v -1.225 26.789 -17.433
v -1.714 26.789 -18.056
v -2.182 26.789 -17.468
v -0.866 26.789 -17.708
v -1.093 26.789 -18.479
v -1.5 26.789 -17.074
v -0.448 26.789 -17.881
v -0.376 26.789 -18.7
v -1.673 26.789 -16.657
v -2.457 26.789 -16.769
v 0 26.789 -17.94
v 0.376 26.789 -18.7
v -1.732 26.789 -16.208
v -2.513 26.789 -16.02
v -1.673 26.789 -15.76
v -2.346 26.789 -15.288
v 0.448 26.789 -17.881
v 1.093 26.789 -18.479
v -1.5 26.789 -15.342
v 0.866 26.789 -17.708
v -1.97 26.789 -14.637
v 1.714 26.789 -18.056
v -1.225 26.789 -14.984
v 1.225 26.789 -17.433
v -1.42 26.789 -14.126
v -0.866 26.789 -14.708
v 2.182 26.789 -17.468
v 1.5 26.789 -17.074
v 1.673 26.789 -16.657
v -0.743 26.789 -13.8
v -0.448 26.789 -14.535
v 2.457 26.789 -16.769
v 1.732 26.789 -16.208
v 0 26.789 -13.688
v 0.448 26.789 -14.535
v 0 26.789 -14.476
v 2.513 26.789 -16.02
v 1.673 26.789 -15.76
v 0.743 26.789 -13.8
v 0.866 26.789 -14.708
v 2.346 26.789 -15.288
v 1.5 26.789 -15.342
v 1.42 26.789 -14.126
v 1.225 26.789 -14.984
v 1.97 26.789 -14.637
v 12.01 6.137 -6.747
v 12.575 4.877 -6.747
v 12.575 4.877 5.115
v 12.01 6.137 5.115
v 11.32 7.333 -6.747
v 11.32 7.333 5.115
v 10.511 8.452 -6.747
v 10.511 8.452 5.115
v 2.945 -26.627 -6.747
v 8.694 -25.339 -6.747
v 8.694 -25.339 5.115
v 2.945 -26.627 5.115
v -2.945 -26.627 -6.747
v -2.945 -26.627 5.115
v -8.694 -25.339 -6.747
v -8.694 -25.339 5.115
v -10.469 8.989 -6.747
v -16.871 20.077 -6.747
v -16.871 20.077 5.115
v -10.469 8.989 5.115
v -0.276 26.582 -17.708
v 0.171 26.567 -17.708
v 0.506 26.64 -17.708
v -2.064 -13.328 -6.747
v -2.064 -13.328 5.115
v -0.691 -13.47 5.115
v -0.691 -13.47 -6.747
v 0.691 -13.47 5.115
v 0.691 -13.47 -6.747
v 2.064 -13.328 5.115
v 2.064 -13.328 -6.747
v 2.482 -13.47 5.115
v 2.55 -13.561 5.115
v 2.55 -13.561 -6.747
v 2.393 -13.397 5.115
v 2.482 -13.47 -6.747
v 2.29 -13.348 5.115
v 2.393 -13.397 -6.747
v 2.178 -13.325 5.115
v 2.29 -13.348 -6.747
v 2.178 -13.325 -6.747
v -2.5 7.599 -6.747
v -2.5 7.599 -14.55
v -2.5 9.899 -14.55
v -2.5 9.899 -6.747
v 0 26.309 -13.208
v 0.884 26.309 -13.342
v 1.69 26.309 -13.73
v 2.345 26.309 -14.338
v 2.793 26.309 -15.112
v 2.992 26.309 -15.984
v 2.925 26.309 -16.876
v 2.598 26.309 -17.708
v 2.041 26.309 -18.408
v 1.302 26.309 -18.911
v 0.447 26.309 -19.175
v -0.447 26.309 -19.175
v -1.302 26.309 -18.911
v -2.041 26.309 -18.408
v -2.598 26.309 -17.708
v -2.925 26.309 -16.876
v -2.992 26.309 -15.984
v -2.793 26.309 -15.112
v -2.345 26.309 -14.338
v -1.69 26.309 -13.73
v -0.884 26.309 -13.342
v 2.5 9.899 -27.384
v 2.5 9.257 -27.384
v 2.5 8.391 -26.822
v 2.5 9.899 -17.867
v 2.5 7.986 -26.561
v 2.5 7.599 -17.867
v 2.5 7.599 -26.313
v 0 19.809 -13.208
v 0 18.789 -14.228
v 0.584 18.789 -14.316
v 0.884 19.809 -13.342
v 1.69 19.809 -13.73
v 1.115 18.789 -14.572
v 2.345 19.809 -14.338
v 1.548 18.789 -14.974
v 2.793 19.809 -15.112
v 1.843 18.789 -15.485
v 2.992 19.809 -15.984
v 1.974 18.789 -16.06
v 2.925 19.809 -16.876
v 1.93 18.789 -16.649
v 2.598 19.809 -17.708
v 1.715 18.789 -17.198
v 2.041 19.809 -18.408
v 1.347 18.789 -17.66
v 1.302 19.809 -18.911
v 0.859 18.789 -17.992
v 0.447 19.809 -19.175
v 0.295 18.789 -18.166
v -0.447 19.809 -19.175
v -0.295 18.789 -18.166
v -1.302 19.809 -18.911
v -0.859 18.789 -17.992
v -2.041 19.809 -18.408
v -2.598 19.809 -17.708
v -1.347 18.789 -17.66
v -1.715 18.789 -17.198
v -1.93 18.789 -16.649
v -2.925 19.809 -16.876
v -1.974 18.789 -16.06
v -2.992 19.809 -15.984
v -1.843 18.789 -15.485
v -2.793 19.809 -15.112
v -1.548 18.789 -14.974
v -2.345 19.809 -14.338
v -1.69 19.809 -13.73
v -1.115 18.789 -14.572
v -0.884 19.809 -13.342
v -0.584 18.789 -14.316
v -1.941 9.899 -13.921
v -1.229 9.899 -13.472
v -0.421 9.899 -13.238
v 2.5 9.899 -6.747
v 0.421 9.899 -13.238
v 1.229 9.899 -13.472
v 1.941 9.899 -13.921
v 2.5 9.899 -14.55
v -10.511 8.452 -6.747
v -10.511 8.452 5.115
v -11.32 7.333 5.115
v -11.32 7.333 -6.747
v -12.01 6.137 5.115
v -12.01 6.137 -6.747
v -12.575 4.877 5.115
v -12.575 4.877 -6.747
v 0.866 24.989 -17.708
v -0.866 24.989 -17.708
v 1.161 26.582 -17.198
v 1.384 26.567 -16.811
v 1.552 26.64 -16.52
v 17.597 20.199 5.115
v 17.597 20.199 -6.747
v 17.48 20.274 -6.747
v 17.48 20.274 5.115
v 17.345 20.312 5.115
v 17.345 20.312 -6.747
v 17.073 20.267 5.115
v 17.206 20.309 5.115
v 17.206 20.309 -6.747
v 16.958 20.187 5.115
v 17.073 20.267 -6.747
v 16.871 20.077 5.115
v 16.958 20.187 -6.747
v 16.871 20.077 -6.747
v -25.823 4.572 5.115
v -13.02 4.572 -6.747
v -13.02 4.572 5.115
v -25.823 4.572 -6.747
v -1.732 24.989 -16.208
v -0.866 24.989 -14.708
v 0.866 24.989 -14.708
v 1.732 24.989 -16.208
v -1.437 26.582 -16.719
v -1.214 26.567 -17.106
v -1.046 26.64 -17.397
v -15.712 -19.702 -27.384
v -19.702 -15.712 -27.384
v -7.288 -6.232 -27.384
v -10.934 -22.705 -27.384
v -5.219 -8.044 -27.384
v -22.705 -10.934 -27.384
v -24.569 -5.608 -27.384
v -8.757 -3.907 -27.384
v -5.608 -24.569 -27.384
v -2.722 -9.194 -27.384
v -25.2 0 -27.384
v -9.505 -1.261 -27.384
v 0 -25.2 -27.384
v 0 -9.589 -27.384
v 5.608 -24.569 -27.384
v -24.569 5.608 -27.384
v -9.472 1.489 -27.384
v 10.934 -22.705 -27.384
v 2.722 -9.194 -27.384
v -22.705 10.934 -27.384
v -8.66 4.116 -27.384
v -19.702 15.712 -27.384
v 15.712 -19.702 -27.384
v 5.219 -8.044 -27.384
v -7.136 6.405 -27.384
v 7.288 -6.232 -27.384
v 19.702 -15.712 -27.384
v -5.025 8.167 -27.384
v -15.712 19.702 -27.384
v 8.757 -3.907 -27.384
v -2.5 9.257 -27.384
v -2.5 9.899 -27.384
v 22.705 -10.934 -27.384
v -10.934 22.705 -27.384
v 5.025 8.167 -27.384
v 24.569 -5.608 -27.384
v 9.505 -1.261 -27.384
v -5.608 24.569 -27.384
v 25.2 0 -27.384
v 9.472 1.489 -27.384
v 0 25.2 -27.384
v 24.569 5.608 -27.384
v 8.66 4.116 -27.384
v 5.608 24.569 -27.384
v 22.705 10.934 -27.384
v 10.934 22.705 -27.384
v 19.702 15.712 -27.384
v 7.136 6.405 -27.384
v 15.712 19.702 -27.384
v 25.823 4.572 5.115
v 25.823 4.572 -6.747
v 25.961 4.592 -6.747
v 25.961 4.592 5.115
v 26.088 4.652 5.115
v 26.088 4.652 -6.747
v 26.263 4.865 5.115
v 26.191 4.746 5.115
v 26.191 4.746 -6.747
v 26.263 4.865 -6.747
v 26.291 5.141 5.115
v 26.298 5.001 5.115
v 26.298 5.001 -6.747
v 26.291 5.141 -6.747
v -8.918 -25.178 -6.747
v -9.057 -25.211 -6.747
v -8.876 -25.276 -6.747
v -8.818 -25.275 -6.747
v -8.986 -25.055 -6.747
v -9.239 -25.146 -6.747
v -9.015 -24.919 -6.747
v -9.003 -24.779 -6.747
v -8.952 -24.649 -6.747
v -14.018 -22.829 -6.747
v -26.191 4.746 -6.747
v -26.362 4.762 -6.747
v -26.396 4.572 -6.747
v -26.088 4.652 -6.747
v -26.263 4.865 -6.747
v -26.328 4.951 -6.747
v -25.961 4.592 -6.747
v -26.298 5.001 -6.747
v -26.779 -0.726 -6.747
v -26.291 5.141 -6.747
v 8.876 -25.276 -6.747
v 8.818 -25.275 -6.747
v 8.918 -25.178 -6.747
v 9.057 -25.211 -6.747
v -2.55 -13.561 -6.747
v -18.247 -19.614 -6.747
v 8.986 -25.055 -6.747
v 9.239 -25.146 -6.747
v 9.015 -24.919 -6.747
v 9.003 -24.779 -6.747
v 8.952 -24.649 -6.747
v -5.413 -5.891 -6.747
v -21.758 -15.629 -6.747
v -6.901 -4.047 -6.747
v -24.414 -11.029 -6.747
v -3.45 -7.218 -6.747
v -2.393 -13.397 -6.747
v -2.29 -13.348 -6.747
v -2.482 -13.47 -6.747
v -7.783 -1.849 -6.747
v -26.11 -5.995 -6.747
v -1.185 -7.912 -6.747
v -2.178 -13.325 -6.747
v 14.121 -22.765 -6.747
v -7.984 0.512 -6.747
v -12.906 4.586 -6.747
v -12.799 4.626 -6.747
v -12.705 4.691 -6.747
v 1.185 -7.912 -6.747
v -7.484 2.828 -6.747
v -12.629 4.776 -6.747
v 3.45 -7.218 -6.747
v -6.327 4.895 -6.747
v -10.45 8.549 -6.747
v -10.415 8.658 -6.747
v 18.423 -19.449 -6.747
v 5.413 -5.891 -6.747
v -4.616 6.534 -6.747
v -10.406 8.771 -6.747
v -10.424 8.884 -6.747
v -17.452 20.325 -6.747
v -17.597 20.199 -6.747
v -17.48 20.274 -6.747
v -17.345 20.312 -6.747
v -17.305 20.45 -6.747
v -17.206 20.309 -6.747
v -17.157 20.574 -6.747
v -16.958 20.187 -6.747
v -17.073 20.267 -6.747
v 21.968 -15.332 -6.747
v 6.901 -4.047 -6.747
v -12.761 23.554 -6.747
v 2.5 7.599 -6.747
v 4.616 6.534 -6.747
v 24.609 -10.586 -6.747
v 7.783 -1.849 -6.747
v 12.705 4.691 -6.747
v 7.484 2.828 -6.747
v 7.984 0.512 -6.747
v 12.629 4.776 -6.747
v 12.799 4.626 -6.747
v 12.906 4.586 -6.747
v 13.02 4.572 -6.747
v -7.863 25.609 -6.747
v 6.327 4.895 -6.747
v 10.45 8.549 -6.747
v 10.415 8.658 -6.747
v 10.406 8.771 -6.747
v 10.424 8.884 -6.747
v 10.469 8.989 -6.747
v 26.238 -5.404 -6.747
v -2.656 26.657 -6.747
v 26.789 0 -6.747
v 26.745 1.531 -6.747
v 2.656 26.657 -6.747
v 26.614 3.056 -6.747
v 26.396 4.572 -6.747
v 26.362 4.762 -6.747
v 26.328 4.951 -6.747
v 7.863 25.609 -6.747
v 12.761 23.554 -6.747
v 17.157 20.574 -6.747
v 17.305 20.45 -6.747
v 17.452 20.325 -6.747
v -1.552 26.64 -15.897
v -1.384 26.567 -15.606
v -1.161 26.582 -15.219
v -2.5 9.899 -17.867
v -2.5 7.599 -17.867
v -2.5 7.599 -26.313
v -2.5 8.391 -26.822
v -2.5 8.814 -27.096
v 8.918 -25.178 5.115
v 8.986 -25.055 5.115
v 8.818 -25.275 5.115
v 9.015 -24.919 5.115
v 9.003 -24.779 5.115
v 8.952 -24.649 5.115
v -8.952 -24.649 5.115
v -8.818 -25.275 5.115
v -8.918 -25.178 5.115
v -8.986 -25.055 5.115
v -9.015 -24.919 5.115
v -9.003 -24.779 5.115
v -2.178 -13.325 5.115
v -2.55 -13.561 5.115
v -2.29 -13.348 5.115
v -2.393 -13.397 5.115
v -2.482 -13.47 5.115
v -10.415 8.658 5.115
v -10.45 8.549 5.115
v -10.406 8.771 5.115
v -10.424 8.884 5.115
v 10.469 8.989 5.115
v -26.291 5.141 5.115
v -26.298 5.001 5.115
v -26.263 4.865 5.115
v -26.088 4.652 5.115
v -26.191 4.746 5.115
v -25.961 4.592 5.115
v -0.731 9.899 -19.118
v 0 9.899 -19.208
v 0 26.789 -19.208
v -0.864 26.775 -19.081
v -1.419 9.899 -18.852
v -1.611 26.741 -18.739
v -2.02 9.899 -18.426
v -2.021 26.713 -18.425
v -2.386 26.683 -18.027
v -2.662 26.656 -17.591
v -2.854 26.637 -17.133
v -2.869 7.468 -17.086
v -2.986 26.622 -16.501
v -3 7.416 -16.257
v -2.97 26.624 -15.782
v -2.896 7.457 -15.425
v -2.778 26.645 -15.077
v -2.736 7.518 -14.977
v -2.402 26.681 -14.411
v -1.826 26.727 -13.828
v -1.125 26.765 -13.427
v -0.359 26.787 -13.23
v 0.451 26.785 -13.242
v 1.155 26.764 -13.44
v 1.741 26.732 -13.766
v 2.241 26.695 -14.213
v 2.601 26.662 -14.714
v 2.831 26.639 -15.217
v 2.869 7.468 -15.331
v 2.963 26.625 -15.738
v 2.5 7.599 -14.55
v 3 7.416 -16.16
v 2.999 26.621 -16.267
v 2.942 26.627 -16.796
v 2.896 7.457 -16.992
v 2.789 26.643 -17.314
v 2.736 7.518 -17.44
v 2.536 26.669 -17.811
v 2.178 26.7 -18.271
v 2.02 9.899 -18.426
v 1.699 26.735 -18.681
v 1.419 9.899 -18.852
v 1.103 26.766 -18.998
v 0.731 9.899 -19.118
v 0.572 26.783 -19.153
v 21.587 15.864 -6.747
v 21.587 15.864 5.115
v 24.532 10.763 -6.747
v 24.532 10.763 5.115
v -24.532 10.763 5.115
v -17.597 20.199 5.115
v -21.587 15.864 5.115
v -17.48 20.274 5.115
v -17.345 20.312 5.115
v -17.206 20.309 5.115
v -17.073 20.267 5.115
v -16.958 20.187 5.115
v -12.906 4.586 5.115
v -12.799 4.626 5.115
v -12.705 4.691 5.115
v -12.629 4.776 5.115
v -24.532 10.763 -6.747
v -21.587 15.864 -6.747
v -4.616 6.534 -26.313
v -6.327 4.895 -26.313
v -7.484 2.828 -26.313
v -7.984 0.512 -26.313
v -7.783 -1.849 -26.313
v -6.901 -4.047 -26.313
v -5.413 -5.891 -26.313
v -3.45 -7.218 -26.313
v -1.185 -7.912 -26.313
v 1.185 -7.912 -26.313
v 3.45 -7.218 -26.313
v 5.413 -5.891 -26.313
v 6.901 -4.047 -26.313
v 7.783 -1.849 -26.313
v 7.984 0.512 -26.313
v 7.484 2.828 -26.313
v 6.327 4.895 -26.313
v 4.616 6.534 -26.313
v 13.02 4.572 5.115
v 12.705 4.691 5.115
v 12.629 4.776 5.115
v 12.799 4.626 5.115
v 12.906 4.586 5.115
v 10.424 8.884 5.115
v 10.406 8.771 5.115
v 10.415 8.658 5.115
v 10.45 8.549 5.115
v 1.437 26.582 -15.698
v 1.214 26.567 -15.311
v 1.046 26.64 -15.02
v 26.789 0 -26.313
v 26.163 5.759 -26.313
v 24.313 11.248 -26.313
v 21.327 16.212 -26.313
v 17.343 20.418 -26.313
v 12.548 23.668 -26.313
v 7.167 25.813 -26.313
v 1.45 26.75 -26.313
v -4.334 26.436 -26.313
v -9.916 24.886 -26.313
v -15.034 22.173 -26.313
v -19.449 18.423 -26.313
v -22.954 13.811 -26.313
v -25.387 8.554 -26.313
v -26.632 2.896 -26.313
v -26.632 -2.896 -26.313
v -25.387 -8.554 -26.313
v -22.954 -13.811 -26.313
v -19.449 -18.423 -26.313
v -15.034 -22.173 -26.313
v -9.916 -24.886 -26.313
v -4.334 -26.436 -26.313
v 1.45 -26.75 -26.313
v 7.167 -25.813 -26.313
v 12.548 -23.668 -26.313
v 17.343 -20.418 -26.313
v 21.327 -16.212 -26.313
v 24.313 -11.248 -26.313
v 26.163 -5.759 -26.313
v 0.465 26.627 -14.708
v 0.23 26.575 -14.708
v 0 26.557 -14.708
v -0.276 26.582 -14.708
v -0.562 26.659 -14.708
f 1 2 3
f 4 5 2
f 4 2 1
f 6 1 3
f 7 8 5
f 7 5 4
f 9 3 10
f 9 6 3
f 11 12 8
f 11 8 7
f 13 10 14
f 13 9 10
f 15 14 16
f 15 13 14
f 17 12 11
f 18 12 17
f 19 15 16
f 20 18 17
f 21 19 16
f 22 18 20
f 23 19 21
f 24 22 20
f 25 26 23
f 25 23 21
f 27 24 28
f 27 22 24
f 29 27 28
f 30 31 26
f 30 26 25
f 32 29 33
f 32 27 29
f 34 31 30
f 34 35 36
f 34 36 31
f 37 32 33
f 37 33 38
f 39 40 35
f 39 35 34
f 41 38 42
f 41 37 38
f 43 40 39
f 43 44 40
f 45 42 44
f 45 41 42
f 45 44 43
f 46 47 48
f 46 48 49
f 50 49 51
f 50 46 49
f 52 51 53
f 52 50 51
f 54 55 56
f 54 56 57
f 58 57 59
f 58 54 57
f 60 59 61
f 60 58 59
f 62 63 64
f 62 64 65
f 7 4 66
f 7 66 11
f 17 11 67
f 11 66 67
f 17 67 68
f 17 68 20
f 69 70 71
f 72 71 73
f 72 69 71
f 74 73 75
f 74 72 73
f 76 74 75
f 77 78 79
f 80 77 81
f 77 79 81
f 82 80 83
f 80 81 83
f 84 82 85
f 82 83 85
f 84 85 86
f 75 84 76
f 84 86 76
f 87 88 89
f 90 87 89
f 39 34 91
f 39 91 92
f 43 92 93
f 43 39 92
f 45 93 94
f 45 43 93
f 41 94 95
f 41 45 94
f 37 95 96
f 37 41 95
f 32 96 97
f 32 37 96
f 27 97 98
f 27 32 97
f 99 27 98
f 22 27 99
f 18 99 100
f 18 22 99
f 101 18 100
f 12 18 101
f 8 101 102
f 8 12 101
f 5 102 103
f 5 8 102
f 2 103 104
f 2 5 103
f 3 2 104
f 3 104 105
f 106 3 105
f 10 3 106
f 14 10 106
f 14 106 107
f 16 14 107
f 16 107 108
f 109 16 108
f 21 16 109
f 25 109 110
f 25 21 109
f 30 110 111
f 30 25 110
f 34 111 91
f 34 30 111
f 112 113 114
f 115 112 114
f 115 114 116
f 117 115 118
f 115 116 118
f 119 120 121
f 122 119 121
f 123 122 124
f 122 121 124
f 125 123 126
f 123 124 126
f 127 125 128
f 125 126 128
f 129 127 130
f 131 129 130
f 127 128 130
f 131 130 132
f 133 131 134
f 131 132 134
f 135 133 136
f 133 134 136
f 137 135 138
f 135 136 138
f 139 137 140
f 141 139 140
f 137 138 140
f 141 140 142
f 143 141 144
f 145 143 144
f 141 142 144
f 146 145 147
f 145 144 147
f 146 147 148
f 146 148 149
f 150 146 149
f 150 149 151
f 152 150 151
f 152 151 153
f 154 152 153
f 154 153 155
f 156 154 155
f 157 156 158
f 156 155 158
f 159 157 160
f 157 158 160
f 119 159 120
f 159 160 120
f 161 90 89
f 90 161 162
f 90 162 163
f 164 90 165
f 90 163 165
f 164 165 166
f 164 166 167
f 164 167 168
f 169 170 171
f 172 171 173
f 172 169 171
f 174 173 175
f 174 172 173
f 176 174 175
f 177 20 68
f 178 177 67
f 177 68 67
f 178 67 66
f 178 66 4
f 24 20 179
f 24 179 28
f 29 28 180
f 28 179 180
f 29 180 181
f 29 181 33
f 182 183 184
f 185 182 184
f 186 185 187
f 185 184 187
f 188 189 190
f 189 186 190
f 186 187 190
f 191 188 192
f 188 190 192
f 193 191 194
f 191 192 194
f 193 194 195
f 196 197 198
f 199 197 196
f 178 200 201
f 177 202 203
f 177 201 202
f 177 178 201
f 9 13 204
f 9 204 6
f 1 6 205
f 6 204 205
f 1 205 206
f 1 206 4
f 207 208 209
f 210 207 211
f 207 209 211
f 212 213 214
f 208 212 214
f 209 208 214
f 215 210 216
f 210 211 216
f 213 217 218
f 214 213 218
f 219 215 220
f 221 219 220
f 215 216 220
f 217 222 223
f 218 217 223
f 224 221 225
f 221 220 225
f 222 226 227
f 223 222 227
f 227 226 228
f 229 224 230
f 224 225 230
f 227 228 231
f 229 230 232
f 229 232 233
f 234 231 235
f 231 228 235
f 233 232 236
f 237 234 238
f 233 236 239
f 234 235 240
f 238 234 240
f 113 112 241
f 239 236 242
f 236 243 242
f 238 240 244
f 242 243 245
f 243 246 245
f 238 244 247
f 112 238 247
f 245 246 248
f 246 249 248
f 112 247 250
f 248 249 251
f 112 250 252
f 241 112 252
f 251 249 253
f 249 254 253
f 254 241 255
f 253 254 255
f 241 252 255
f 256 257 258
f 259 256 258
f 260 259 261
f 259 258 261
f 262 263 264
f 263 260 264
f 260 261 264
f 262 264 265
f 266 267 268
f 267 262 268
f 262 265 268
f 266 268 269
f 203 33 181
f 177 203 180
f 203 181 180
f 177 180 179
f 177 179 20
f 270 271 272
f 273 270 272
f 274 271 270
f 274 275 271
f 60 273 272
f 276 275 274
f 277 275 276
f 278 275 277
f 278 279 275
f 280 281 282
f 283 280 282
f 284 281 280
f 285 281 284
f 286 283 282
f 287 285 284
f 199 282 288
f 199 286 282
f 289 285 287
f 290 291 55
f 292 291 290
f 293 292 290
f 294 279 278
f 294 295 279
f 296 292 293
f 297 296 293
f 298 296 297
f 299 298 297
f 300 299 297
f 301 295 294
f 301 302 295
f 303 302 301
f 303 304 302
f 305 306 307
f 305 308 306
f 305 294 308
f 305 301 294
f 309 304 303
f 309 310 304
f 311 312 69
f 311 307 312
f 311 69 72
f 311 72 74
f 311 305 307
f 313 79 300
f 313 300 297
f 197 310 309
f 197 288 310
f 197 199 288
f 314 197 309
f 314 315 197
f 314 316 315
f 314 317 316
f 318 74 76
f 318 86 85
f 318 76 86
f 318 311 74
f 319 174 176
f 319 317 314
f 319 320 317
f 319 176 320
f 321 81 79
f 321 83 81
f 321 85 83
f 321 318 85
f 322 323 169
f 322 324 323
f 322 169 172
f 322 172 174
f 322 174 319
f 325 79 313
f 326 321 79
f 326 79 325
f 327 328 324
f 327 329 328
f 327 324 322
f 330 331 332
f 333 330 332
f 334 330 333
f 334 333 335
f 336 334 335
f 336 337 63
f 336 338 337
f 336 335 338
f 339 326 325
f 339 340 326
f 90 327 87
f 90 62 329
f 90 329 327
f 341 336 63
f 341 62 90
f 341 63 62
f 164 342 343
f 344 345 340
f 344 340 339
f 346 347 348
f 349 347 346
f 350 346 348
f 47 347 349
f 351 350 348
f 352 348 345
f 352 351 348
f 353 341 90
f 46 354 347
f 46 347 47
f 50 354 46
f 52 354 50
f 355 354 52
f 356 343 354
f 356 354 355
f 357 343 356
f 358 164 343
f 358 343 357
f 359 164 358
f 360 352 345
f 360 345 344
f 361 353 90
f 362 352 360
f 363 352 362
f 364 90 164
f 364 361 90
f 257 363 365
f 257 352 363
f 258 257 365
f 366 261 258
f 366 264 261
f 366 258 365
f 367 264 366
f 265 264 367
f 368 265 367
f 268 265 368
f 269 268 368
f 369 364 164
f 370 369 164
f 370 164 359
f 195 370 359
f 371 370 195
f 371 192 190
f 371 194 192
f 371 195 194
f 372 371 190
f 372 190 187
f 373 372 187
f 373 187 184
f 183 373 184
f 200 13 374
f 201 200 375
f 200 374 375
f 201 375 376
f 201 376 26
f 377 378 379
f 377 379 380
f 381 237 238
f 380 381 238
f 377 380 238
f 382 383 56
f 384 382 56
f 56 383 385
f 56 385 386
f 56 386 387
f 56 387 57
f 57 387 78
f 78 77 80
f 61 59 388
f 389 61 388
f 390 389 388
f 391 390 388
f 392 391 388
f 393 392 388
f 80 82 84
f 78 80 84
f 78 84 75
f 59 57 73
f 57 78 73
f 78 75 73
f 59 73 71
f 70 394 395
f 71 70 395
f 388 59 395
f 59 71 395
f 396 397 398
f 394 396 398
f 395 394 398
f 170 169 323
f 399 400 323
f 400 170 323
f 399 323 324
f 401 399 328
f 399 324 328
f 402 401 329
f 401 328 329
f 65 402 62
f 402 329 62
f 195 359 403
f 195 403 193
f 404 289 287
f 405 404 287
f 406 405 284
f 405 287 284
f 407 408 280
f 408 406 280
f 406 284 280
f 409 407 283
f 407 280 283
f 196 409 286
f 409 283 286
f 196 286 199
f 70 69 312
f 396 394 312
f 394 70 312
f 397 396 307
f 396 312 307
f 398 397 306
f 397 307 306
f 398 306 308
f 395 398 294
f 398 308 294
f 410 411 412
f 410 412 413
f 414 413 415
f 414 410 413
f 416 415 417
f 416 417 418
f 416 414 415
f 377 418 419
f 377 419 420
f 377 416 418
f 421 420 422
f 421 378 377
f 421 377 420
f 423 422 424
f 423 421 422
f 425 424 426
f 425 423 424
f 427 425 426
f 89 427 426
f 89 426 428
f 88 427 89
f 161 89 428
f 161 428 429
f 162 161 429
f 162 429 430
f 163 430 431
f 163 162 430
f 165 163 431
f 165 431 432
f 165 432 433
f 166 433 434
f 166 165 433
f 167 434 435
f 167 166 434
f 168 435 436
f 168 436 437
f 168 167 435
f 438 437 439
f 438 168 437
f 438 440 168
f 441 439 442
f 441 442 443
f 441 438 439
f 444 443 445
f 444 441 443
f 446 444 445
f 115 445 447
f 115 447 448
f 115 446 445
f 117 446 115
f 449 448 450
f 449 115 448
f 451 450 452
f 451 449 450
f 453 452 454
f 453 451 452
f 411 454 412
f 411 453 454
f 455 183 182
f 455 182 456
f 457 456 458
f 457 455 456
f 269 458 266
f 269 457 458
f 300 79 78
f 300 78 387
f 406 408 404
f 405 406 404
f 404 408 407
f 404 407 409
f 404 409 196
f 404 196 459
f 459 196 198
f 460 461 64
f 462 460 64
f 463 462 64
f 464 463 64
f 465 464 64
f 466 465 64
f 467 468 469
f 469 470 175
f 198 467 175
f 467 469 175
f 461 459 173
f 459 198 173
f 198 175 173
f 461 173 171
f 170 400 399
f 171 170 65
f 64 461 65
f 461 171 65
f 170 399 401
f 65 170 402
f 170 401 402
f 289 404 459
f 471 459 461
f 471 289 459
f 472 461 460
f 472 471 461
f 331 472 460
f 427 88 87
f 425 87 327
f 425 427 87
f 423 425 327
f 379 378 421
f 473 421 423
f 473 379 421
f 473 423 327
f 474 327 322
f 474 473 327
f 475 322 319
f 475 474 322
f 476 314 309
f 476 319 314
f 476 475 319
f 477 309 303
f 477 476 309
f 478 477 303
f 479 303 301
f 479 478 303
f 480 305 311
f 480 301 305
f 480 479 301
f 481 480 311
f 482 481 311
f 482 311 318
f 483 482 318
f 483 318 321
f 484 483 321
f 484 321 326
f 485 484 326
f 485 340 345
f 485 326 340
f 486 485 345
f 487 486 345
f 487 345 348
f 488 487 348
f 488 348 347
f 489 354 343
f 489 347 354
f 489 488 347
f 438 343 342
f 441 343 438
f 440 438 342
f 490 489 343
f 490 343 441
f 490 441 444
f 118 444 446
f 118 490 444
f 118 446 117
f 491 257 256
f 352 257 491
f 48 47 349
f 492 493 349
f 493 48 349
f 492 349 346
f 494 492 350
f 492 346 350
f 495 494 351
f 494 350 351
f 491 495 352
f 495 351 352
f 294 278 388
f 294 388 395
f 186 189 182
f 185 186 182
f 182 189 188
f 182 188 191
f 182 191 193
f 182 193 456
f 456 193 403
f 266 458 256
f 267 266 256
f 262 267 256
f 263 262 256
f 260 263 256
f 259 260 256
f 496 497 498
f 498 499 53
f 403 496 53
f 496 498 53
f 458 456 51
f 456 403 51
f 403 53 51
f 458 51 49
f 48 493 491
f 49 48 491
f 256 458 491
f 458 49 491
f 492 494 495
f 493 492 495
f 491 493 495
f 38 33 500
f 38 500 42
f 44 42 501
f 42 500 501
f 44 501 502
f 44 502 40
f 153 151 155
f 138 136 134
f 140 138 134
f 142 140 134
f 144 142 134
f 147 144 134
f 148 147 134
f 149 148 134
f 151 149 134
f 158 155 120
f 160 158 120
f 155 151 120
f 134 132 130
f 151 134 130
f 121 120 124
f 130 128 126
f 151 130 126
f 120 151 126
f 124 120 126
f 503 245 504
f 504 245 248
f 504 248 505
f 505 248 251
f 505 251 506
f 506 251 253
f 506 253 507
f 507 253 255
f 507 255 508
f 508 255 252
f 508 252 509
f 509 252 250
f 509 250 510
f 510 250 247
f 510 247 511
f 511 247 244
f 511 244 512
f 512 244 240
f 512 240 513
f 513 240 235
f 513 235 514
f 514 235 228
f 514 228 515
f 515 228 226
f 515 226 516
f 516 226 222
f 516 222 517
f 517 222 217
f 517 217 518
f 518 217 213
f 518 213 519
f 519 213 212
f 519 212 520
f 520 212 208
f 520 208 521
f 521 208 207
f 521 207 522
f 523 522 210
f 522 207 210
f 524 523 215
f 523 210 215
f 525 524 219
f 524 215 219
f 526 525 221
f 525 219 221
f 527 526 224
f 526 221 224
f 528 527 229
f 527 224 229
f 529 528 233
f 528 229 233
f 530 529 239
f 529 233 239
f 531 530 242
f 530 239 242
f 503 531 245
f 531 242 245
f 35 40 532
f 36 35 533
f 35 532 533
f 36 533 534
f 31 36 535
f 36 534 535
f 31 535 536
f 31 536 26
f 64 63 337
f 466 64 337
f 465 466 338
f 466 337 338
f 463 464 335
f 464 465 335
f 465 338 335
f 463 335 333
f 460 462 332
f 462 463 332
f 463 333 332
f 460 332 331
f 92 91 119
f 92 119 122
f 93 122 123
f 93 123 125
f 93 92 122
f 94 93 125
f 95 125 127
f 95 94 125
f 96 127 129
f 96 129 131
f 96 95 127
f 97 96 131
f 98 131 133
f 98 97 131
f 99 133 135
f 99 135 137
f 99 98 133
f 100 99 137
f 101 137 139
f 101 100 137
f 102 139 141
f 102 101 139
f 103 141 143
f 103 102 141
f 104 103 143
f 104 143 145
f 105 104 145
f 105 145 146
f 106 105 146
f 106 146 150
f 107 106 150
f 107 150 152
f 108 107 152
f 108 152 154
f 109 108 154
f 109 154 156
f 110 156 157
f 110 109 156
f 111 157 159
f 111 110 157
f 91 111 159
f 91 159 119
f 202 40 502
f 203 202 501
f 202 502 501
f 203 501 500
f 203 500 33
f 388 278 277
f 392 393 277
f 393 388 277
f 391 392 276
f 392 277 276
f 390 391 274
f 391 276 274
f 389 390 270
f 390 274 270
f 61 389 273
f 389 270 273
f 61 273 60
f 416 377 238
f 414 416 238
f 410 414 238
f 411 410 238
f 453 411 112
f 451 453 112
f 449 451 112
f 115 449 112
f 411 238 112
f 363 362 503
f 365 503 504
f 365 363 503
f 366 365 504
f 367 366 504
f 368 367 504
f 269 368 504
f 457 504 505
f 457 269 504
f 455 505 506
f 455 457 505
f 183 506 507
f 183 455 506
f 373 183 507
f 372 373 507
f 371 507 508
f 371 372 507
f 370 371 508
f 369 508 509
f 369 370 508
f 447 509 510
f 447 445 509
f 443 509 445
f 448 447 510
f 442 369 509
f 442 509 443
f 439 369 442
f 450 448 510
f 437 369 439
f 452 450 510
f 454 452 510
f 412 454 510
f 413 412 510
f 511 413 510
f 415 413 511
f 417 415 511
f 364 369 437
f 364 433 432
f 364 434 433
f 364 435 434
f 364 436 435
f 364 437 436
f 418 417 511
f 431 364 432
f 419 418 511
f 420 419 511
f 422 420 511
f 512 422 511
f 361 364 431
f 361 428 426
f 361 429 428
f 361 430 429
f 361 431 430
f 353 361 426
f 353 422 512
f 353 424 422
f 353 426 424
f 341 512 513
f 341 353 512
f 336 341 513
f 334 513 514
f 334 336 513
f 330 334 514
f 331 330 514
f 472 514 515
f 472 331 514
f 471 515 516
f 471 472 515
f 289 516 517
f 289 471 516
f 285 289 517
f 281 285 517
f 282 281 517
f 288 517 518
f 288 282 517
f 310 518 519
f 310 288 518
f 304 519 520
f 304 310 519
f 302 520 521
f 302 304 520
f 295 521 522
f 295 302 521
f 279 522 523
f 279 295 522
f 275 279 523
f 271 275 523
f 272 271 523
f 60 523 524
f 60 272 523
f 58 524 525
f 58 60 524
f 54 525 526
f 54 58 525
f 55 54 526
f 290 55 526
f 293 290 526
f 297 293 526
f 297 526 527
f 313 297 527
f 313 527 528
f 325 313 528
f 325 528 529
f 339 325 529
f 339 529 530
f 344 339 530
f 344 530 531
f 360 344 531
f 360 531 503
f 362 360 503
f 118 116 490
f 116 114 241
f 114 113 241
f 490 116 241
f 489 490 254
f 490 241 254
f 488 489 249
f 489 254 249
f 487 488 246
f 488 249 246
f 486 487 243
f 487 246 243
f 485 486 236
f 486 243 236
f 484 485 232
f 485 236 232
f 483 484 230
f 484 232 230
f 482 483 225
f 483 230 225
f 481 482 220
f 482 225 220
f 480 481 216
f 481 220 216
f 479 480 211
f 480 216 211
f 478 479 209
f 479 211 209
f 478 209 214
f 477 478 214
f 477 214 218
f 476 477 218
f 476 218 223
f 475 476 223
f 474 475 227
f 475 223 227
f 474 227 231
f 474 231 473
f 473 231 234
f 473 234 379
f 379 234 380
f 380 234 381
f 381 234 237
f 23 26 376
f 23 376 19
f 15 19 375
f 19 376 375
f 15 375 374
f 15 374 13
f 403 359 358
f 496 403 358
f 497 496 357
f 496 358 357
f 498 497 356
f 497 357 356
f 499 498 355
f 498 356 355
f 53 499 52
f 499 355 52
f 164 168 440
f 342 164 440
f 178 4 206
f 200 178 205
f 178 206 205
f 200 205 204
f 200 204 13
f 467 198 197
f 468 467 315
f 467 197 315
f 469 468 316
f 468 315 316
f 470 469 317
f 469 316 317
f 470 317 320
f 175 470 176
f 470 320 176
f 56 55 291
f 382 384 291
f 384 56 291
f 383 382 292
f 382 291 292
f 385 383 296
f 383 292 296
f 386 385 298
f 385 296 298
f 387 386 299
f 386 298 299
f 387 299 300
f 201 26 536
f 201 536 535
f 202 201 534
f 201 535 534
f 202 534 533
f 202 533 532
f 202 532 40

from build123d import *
from OCP.BRepFilletAPI import BRepFilletAPI_MakeChamfer

# Parameters (mm, degrees)
BOSS_EXTRUDE1_START      = -6.746875
SKETCH1_R                = 26.7890625
BOSS_EXTRUDE1_DEPTH      = 20.6375
BOSS_EXTRUDE2_DEPTH      = 11.8618
FILLET1_R                = 0.476990821
CIRPATTERN1_COUNT        = 3
FILLET1_OF_CIRPATTERN1_R = 0.476990821
CUT_EXTRUDE5_DEPTH       = 47.746248335
CUT_EXTRUDE5_DEPTH_BACK  = 47.746248335
SKETCH15_R               = 8
CHAMFER1_SIZE            = 1.0715625
CHAMFER1_SIZE2           = 1.588656738
CUT_EXTRUDE1_DEPTH       = 47.746248335
CUT_EXTRUDE1_DEPTH_BACK  = 47.746248335
SKETCH5_R                = 3
CUT_EXTRUDE2_DEPTH       = 47.746248335
SKETCH6_R                = 3
BOSS_EXTRUDE3_DEPTH      = 8
CUT_EXTRUDE3_DEPTH       = 1.8
CHAMFER3_SIZE            = 0.48
CHAMFER4_SIZE            = 1.02


with BuildPart() as part:
    # Sketch1 → Boss-Extrude1 (new body)
    with BuildSketch(Plane.XY.offset(BOSS_EXTRUDE1_START)):
        Circle(SKETCH1_R)
    extrude(amount=-BOSS_EXTRUDE1_DEPTH)

    # Sketch2 → Boss-Extrude2 (add)
    with BuildSketch(Plane.XY.offset(-6.746875)):
        with BuildLine():
            Line((-9.238549561, -25.145637229), (-2.384954104, -13.274861682))
            ThreePointArc((-2.384954104, -13.274861682), (0, -13.4874), (2.384954104, -13.274861682))
            Line((2.384954104, -13.274861682), (9.238549561, -25.145637229))
            ThreePointArc((9.238549561, -25.145637229), (0, -26.7890625), (-9.238549561, -25.145637229))
        make_face()
    boss_extrude2 = extrude(amount=BOSS_EXTRUDE2_DEPTH)

    # Fillet1
    # the kernel refuses this fillet: 0.476990821 mm, written as the material it takes off along each edge
    with BuildSketch(Plane(origin=(-9.238549561, -25.145637229, -6.746875), x_dir=(0.9423194959651416, -0.33471475546202245, 0), z_dir=(0, 0, 1))) as fillet1_piece_1:
        with BuildLine():
            CenterArc((0.572952448, 0.476963054), FILLET1_R, 169.55519331, 101.063030663)
            Line((0.103865366, 0.563435893), (0, 0))
            ThreePointArc((0, 0), (0.28904955, -0.001559444), (0.5780991, 0))
        make_face()
    extrude(amount=13.307047751, mode=Mode.SUBTRACT)
    with BuildSketch(Plane(origin=(9.238549561, -25.145637229, -6.746875), x_dir=(-0.9423194959651411, -0.3347147554620237, 0), z_dir=(0, 0, 1))) as fillet1_piece_2:
        with BuildLine():
            CenterArc((0.572952448, -0.476963054), FILLET1_R, 89.381776027, 101.063030663)
            Line((0.103865366, -0.563435893), (0, 0))
            ThreePointArc((0, 0), (0.28904955, 0.001559444), (0.5780991, 0))
        make_face()
    extrude(amount=13.307047751, mode=Mode.SUBTRACT)
    with BuildSketch(Plane(origin=(2.384954104, -13.274861682, -6.746875), x_dir=(0.49999999999999706, -0.8660254037844404, 0), z_dir=(0, 0, 1))) as fillet1_piece_3:
        with BuildLine():
            CenterArc((0.330829178, -0.476990821), FILLET1_R, 90, 68.803855098)
            ThreePointArc((-0.113892323, -0.304529143), (-0.056028498, -0.152607773), (0, 0))
            Line((0, 0), (0.330829178, 0))
        make_face()
    extrude(amount=12.688872944, mode=Mode.SUBTRACT)
    with BuildSketch(Plane(origin=(-2.384954104, -13.274861682, -6.746875), x_dir=(0.9863015455813384, -0.16495229972286882, 0), z_dir=(0, 0, 1))) as fillet1_piece_4:
        with BuildLine():
            CenterArc((0.330879129, -0.476956172), FILLET1_R, 90.690608377, 68.803855098)
            Line((-0.115888763, -0.309867293), (0, 0))
            ThreePointArc((0, 0), (0.162564956, -0.000979741), (0.325129912, 0))
        make_face()
    extrude(amount=12.688872944, mode=Mode.SUBTRACT)

    # CirPattern1: Boss-Extrude2 ×3 about axis
    cirpattern1_axis = Axis((0, 0, 0), (0, 0, 1))
    for i in range(1, CIRPATTERN1_COUNT):
        add(boss_extrude2.rotate(cirpattern1_axis, i * 360 / CIRPATTERN1_COUNT))

    # Fillet1 of CirPattern1
    # the kernel refuses this fillet: 0.476990821 mm, written as the material it takes off along each edge
    with BuildSketch(Plane(origin=(26.396035415, 4.572, -6.746875), x_dir=(-0.18128826673094764, 0.9834299997181745, 0), z_dir=(0, 0, 1)), Plane(origin=(-17.157485854, 20.573637229, -6.746875), x_dir=(-0.761031229234182, -0.6487152442561451, 0), z_dir=(0, 0, 1))) as fillet1_of_cirpattern1_piece_1:
        with BuildLine():
            CenterArc((0.572952448, 0.476963054), FILLET1_OF_CIRPATTERN1_R, 169.55519331, 101.063030663)
            Line((0.103865366, 0.563435893), (0, 0))
            ThreePointArc((0, 0), (0.28904955, -0.001559444), (0.5780991, 0))
        make_face()
    extrude(amount=13.307047751, mode=Mode.SUBTRACT)
    with BuildSketch(Plane(origin=(17.157485854, 20.573637229, -6.746875), x_dir=(0.7610312292341833, -0.6487152442561435, 0), z_dir=(0, 0, 1)), Plane(origin=(-26.396035415, 4.572, -6.746875), x_dir=(0.181288266730962, 0.9834299997181718, 0), z_dir=(0, 0, 1))) as fillet1_of_cirpattern1_piece_2:
        with BuildLine():
            CenterArc((0.572952448, -0.476963054), FILLET1_OF_CIRPATTERN1_R, 89.381776027, 101.063030663)
            Line((0.103865366, -0.563435893), (0, 0))
            ThreePointArc((0, 0), (0.28904955, 0.001559444), (0.5780991, 0))
        make_face()
    extrude(amount=13.307047751, mode=Mode.SUBTRACT)
    with BuildSketch(Plane(origin=(10.303890396, 8.702861682, -6.746875), x_dir=(0.5000000000000006, 0.8660254037844383, 0), z_dir=(0, 0, 1)), Plane(origin=(-12.688844501, 4.572, -6.746875), x_dir=(-1, 0, 0), z_dir=(0, 0, 1))) as fillet1_of_cirpattern1_piece_3:
        with BuildLine():
            CenterArc((0.330829178, -0.476990821), FILLET1_OF_CIRPATTERN1_R, 90, 68.803855098)
            ThreePointArc((-0.113892323, -0.304529143), (-0.056028498, -0.152607773), (0, 0))
            Line((0, 0), (0.330829178, 0))
        make_face()
    extrude(amount=12.688872944, mode=Mode.SUBTRACT)
    with BuildSketch(Plane(origin=(12.688844501, 4.572, -6.746875), x_dir=(-0.3502978908180006, 0.9366383441267288, 0), z_dir=(0, 0, 1)), Plane(origin=(-10.303890396, 8.702861682, -6.746875), x_dir=(-0.6360036547633316, -0.7716860444038657, 0), z_dir=(0, 0, 1))) as fillet1_of_cirpattern1_piece_4:
        with BuildLine():
            CenterArc((0.330879129, -0.476956172), FILLET1_OF_CIRPATTERN1_R, 90.690608377, 68.803855098)
            Line((-0.115888763, -0.309867293), (0, 0))
            ThreePointArc((0, 0), (0.162564956, -0.000979741), (0.325129912, 0))
        make_face()
    extrude(amount=12.688872944, mode=Mode.SUBTRACT)

    # Sketch15 → Cut-Extrude5 (cut, two sides: drawn at the far end of the back side and taken through both)
    with BuildSketch(Plane.XY.offset(-CUT_EXTRUDE5_DEPTH_BACK)):
        Circle(SKETCH15_R)
    extrude(amount=CUT_EXTRUDE5_DEPTH + CUT_EXTRUDE5_DEPTH_BACK, mode=Mode.SUBTRACT)

    # Chamfer1: one chamfer whose edges measure the first distance from different faces: ONE call of the kernel's chamfer builder (chamfer() names one face for all edges)
    chamfer1_edges_1 = [part.edges().sort_by_distance(p)[0] for p in [
        (-26.7890625, 0, -27.384375),
    ]]
    chamfer1_side_1 = [part.faces().sort_by_distance(p)[0] for p in [
        (-26.7890625, 0, -17.065625),
    ]]
    chamfer1_edges_2 = [part.edges().sort_by_distance(p)[0] for p in [
        (-8, 0, -27.384375),
    ]]
    chamfer1_side_2 = [part.faces().sort_by_distance(p)[0] for p in [
        (-8, 0, -17.065625),
    ]]
    chamfer1 = BRepFilletAPI_MakeChamfer(part.part.solid().wrapped)
    for e in chamfer1_edges_1:
        chamfer1.Add(CHAMFER1_SIZE, CHAMFER1_SIZE2, e.wrapped, chamfer1_side_1[0].wrapped)  # the first distance lies on this face
    for e in chamfer1_edges_2:
        chamfer1.Add(CHAMFER1_SIZE, CHAMFER1_SIZE2, e.wrapped, chamfer1_side_2[0].wrapped)  # the first distance lies on this face
    add(Compound.cast(chamfer1.Shape()), mode=Mode.REPLACE)

    # Sketch4 → Cut-Extrude1 (cut, two sides: drawn at the far end of the back side and taken through both)
    with BuildSketch(Plane.XY.offset(-CUT_EXTRUDE1_DEPTH_BACK)):
        with BuildLine():
            Line((-2.5, 9.899342077), (2.5, 9.899342077))
            Line((2.5, 9.899342077), (2.5, 7.599342077))
            ThreePointArc((2.5, 7.599342077), (0, 8), (-2.5, 7.599342077))
            Line((-2.5, 7.599342077), (-2.5, 9.899342077))
        make_face()
    extrude(amount=CUT_EXTRUDE1_DEPTH + CUT_EXTRUDE1_DEPTH_BACK, mode=Mode.SUBTRACT)

    # Sketch5 → Cut-Extrude2 (cut, through all)
    with BuildSketch(Plane(origin=(0, 0, 0), x_dir=(1, 0, 0), z_dir=(0, 1, 0))):
        with Locations(Location((0, 16.208375, 0), (0, 0, 90))):
            Circle(SKETCH5_R)
    extrude(amount=CUT_EXTRUDE2_DEPTH, mode=Mode.SUBTRACT)


with BuildPart() as body_2:
    # Sketch6 → Boss-Extrude3 (new body)
    with BuildSketch(Plane(origin=(0, 26.7890625, 0), x_dir=(-1, 0, 0), z_dir=(0, 1, 0))):
        with Locations(Location((0, -16.208375, 0), (0, 0, 90))):
            Circle(SKETCH6_R)
    extrude(amount=-BOSS_EXTRUDE3_DEPTH)

    # Sketch8 → Cut-Extrude3 (cut)
    with BuildSketch(Plane(origin=(0, 26.7890625, 0), x_dir=(1, 0, 0), z_dir=(0, 1, 0))):
        Polygon((0.866025404, 14.708375), (1.732050808, 16.208375), (0.866025404, 17.708375), (-0.866025404, 17.708375), (-1.732050808, 16.208375), (-0.866025404, 14.708375), align=None)
    extrude(amount=-CUT_EXTRUDE3_DEPTH, mode=Mode.SUBTRACT)

    # Cut-Extrude4 cone 1 section (through the dimple's axis) → Cut-Extrude4 (revolve, cut)
    with BuildSketch(Plane(origin=(0, 26.7890625, -16.208375), x_dir=(0, 0, 1), z_dir=(1, 0, 0))):
        Polygon((0, 0), (1.732050808, 0), (0, 1.732050808), align=None)
    revolve(axis=Axis((0, 26.7890625, -16.208375), (0, -1, 0)), mode=Mode.SUBTRACT)

    # Chamfer3
    chamfer3_edges = [body_2.edges().sort_by_distance(p)[0] for p in [
        (0, 26.7890625, -19.208375),
    ]]
    chamfer(chamfer3_edges, length=CHAMFER3_SIZE)

    # Chamfer4
    chamfer4_edges = [body_2.edges().sort_by_distance(p)[0] for p in [
        (0, 18.7890625, -19.208375),
    ]]
    chamfer(chamfer4_edges, length=CHAMFER4_SIZE)


solid = Compound([part.part, body_2.part])
